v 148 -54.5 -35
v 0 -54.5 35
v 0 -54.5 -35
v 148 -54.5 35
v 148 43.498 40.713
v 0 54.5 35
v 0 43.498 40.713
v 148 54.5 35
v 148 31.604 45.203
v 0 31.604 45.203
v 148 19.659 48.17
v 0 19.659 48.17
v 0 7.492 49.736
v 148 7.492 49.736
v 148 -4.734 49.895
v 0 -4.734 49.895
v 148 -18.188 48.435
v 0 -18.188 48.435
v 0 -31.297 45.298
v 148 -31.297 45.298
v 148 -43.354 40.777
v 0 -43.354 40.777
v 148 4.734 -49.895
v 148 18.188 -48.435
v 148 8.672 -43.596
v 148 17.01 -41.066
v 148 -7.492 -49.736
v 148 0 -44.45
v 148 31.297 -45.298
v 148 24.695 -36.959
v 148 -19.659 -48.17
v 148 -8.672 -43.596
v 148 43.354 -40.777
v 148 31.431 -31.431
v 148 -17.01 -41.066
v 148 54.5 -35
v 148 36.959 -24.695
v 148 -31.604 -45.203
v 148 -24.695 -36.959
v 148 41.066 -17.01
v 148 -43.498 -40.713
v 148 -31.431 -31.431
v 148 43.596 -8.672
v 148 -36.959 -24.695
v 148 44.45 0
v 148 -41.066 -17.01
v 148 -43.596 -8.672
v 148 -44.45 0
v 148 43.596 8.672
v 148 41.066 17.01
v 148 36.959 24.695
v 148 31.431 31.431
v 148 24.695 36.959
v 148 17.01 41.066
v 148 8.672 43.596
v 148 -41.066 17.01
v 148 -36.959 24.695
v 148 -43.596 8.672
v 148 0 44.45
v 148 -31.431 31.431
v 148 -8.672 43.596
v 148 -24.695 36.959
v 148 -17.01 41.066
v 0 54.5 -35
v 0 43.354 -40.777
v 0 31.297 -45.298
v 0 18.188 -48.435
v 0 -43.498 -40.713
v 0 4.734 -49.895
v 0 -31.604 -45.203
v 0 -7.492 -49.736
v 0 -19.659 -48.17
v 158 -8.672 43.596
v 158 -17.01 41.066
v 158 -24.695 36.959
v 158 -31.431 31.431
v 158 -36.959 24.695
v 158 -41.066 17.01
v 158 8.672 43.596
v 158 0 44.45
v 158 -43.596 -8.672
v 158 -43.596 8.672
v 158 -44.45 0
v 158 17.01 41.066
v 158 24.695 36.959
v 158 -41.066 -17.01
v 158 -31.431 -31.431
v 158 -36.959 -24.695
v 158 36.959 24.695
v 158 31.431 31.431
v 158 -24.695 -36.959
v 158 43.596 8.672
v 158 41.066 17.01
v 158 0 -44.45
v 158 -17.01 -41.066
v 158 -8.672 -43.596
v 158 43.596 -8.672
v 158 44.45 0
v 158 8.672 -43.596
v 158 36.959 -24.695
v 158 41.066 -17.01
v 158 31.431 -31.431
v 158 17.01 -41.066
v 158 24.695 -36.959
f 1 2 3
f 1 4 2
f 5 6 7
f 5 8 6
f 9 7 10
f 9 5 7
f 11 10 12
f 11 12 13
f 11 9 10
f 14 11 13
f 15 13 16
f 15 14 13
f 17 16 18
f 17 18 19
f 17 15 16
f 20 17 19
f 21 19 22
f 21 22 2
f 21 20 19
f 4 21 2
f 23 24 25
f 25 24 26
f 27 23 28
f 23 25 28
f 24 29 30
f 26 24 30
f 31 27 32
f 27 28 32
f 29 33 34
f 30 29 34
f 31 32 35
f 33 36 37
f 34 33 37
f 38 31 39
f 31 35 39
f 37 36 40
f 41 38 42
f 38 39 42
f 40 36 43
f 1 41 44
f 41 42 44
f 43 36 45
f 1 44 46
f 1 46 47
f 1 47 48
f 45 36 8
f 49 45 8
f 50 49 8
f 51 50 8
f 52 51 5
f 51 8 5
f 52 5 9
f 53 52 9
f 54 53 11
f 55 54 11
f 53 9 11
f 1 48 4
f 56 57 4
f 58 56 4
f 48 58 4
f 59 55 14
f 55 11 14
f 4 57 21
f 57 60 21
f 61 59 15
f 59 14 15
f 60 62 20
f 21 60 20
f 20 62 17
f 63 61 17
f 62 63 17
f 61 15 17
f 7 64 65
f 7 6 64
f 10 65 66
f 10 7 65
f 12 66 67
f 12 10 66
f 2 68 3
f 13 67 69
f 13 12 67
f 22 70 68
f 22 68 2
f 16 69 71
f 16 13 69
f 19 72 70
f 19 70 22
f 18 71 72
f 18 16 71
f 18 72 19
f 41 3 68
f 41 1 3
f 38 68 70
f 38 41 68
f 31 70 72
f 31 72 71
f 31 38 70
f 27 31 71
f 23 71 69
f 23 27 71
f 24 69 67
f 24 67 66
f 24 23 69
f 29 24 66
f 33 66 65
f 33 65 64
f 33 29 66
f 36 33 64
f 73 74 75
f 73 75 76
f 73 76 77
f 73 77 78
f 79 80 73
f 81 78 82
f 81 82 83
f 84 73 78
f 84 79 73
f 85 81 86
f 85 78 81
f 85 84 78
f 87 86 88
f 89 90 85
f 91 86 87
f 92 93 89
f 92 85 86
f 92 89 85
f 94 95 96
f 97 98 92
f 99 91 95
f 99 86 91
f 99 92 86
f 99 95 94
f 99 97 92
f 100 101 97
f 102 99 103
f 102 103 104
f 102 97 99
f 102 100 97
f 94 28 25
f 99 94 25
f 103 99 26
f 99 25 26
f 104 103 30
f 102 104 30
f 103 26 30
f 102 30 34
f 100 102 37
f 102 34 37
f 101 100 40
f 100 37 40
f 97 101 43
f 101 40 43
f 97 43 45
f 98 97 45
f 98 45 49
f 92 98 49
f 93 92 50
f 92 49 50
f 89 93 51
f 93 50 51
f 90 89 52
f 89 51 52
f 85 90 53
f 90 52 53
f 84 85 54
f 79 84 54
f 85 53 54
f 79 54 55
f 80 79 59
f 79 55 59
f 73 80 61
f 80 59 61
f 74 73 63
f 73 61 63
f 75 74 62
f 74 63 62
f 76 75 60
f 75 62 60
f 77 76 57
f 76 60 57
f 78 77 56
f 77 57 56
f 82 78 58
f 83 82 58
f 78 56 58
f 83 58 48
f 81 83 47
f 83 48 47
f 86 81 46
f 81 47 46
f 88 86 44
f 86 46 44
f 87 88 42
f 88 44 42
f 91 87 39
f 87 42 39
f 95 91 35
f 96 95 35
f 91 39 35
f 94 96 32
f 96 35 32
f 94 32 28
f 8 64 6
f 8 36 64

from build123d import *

# Parameters (mm, degrees)
SKETCH6_R           = 44.45
BOSS_EXTRUDE3_DEPTH = 10


with BuildPart() as part:
    # Sketch1 for Loft3 → Loft3 section 0
    with BuildSketch(Plane(origin=(0, 0, 0), x_dir=(0, 0, 1), z_dir=(1, 0, 0))):
        with BuildLine():
            Line((-35, -54.5), (35, -54.5))
            # circular arc as an exact rational Bezier (weights 1, cos(half-angle), 1)
            Bezier((35, -54.5), (67.45879246, 0), (35, 54.5), weights=[1, 0.859165949, 1])
            Line((35, 54.5), (-35, 54.5))
            Bezier((-35, 54.5), (-67.45879246, 0), (-35, -54.5), weights=[1, 0.859165949, 1])
        make_face()
    # Sketch5 for Loft3 → Loft3 section 1
    with BuildSketch(Plane(origin=(148, 148, 0), x_dir=(0, -1, 0), z_dir=(1, 0, 0))):
        with BuildLine():
            Line((93.5, 35), (93.5, -35))
            Bezier((93.5, -35), (148, -67.45879246), (202.5, -35), weights=[1, 0.859165949, 1])
            Line((202.5, -35), (202.5, 35))
            Bezier((202.5, 35), (148, 67.45879246), (93.5, 35), weights=[1, 0.859165949, 1])
        make_face()
    loft()

    # Sketch6 → Boss-Extrude3 (add)
    with BuildSketch(Plane(origin=(148, 0, 0), x_dir=(0, 0, -1), z_dir=(1, 0, 0))):
        Circle(SKETCH6_R)
    extrude(amount=BOSS_EXTRUDE3_DEPTH)


solid = part.part
